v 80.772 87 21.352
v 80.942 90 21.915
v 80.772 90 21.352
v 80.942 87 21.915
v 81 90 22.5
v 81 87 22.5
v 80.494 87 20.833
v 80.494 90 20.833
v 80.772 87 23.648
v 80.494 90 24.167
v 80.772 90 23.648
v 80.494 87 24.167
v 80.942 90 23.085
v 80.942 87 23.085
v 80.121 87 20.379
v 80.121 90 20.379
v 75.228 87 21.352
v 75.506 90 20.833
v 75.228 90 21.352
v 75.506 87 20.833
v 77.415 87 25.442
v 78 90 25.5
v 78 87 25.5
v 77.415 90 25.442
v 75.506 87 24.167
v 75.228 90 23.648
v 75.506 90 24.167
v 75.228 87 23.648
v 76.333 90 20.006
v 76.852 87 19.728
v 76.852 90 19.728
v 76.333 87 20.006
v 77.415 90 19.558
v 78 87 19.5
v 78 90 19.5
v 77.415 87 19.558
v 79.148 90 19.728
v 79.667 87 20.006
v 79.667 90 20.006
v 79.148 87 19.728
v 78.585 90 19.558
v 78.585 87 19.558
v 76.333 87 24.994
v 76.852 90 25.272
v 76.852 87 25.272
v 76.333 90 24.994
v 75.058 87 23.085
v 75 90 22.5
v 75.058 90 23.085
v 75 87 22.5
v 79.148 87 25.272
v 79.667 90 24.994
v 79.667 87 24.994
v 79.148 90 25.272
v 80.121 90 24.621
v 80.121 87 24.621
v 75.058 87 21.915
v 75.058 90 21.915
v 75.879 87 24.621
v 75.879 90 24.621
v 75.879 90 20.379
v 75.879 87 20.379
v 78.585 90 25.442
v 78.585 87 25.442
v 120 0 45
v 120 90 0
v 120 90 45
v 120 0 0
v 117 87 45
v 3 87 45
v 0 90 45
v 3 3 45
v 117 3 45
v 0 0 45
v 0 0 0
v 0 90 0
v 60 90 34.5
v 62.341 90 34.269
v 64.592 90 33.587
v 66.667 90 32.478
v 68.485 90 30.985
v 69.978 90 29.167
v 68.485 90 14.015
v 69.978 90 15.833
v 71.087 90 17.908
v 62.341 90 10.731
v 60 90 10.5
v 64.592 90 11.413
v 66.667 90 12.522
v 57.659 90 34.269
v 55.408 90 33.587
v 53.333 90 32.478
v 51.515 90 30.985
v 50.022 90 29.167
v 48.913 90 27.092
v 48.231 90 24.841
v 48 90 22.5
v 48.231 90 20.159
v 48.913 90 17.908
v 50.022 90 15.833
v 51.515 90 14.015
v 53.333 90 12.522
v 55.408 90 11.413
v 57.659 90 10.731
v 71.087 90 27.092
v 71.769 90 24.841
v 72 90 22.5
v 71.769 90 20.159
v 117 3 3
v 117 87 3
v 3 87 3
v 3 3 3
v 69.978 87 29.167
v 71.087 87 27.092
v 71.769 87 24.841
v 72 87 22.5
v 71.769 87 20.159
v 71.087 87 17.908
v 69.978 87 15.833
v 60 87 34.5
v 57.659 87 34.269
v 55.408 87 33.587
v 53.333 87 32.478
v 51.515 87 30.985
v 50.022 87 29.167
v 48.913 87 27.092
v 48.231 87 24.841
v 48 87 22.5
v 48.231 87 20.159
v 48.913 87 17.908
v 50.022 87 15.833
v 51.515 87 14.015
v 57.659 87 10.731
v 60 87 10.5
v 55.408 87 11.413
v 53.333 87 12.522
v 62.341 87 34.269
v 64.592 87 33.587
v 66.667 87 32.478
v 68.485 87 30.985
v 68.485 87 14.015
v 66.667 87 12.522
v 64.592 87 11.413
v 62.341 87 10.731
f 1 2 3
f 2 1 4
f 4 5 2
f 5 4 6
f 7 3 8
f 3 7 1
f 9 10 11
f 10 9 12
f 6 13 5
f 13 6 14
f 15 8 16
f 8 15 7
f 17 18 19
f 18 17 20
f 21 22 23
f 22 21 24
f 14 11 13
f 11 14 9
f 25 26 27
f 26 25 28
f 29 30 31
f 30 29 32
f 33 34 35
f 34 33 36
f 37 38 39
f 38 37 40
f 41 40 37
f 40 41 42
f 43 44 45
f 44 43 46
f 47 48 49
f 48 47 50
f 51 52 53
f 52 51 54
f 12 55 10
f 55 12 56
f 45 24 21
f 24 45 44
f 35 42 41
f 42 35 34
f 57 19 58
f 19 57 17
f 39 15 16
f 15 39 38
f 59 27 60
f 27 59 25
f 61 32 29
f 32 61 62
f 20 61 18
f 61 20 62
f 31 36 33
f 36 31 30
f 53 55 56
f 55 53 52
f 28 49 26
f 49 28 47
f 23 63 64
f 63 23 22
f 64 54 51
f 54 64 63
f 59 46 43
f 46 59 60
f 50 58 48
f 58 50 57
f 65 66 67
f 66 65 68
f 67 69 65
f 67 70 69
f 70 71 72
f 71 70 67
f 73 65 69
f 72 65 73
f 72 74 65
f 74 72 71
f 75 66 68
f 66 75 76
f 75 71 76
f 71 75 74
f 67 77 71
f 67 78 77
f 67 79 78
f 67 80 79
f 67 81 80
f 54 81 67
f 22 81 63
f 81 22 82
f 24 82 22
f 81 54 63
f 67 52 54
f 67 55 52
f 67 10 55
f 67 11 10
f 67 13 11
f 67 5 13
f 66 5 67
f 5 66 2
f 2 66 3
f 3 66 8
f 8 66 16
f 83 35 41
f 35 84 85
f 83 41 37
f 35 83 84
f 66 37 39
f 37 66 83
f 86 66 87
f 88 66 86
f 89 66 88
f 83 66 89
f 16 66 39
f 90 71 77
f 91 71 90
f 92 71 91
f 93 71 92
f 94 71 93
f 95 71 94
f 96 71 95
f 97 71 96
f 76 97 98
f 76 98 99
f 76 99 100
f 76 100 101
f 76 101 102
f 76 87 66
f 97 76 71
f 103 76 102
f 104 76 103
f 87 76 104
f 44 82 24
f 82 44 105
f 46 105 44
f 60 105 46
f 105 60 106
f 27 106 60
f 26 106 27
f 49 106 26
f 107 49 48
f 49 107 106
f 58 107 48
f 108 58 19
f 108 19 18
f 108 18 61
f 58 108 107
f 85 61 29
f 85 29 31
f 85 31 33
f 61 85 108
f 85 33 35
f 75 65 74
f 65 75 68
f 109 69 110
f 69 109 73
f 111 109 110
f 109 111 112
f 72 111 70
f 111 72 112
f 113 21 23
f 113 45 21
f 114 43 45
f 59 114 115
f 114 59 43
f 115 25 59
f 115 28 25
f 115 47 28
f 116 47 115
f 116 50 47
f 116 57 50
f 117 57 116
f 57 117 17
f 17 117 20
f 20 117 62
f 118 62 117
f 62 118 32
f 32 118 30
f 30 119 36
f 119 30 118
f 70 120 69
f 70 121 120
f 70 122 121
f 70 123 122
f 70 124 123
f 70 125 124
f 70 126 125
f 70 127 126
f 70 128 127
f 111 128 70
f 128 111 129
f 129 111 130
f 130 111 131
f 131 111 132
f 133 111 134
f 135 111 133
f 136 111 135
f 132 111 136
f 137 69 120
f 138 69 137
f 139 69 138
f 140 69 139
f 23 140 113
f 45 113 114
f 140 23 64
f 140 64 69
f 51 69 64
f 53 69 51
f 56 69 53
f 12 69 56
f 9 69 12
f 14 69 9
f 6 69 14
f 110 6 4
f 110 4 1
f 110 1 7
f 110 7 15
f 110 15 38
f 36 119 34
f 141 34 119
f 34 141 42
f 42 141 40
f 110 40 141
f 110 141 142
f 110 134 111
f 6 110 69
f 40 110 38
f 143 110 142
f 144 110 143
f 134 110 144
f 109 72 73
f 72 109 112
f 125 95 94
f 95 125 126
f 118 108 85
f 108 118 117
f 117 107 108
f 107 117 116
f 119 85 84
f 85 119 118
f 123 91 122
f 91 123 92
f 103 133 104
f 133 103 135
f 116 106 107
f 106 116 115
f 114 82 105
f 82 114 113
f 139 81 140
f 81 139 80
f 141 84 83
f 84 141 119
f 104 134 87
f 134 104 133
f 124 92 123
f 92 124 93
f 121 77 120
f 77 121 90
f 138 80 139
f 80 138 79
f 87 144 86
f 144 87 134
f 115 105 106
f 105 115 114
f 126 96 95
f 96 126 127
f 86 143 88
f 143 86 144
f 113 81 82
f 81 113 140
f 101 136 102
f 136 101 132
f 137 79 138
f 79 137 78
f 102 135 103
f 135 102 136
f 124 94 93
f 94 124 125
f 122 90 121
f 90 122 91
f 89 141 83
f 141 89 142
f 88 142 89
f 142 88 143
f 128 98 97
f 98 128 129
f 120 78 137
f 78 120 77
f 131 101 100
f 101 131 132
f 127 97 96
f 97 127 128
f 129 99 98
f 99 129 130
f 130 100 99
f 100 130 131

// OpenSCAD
$fn = 32;

// ----------------------------------------------------------------------
// Vent box: roundvent enclosure
// ----------------------------------------------------------------------

// --- parameters (mm) ---
box_l = 120;              // box length, X
box_w = 90;               // box width, Y
box_h = 45;               // box height, Z
wall_t = 3;               // shell wall thickness
vent_d = 24;              // central vent diameter
ring_d = 6;               // ring hole diameter
n_ring = 6;               // holes in the ring
ring_r = 18;              // ring radius

ring_step = 360 / n_ring;  // ring hole angular step

difference() {
  cube([box_l, box_w, box_h]);
  translate([wall_t, wall_t, wall_t])
    cube([box_l - 2 * wall_t, box_w - 2 * wall_t, box_h]);
  translate([box_l / 2, box_w - wall_t - 1, box_h / 2])
    rotate([-90, 0, 0]) cylinder(h = wall_t + 2, d = vent_d);
  for (i = [0 : n_ring - 1])
    translate([box_l / 2, box_w - wall_t - 1, box_h / 2])
      rotate([0, 0, i * ring_step])
        translate([ring_r, 0, 0]) rotate([-90, 0, 0])
          cylinder(h = wall_t + 2, d = ring_d);
}
